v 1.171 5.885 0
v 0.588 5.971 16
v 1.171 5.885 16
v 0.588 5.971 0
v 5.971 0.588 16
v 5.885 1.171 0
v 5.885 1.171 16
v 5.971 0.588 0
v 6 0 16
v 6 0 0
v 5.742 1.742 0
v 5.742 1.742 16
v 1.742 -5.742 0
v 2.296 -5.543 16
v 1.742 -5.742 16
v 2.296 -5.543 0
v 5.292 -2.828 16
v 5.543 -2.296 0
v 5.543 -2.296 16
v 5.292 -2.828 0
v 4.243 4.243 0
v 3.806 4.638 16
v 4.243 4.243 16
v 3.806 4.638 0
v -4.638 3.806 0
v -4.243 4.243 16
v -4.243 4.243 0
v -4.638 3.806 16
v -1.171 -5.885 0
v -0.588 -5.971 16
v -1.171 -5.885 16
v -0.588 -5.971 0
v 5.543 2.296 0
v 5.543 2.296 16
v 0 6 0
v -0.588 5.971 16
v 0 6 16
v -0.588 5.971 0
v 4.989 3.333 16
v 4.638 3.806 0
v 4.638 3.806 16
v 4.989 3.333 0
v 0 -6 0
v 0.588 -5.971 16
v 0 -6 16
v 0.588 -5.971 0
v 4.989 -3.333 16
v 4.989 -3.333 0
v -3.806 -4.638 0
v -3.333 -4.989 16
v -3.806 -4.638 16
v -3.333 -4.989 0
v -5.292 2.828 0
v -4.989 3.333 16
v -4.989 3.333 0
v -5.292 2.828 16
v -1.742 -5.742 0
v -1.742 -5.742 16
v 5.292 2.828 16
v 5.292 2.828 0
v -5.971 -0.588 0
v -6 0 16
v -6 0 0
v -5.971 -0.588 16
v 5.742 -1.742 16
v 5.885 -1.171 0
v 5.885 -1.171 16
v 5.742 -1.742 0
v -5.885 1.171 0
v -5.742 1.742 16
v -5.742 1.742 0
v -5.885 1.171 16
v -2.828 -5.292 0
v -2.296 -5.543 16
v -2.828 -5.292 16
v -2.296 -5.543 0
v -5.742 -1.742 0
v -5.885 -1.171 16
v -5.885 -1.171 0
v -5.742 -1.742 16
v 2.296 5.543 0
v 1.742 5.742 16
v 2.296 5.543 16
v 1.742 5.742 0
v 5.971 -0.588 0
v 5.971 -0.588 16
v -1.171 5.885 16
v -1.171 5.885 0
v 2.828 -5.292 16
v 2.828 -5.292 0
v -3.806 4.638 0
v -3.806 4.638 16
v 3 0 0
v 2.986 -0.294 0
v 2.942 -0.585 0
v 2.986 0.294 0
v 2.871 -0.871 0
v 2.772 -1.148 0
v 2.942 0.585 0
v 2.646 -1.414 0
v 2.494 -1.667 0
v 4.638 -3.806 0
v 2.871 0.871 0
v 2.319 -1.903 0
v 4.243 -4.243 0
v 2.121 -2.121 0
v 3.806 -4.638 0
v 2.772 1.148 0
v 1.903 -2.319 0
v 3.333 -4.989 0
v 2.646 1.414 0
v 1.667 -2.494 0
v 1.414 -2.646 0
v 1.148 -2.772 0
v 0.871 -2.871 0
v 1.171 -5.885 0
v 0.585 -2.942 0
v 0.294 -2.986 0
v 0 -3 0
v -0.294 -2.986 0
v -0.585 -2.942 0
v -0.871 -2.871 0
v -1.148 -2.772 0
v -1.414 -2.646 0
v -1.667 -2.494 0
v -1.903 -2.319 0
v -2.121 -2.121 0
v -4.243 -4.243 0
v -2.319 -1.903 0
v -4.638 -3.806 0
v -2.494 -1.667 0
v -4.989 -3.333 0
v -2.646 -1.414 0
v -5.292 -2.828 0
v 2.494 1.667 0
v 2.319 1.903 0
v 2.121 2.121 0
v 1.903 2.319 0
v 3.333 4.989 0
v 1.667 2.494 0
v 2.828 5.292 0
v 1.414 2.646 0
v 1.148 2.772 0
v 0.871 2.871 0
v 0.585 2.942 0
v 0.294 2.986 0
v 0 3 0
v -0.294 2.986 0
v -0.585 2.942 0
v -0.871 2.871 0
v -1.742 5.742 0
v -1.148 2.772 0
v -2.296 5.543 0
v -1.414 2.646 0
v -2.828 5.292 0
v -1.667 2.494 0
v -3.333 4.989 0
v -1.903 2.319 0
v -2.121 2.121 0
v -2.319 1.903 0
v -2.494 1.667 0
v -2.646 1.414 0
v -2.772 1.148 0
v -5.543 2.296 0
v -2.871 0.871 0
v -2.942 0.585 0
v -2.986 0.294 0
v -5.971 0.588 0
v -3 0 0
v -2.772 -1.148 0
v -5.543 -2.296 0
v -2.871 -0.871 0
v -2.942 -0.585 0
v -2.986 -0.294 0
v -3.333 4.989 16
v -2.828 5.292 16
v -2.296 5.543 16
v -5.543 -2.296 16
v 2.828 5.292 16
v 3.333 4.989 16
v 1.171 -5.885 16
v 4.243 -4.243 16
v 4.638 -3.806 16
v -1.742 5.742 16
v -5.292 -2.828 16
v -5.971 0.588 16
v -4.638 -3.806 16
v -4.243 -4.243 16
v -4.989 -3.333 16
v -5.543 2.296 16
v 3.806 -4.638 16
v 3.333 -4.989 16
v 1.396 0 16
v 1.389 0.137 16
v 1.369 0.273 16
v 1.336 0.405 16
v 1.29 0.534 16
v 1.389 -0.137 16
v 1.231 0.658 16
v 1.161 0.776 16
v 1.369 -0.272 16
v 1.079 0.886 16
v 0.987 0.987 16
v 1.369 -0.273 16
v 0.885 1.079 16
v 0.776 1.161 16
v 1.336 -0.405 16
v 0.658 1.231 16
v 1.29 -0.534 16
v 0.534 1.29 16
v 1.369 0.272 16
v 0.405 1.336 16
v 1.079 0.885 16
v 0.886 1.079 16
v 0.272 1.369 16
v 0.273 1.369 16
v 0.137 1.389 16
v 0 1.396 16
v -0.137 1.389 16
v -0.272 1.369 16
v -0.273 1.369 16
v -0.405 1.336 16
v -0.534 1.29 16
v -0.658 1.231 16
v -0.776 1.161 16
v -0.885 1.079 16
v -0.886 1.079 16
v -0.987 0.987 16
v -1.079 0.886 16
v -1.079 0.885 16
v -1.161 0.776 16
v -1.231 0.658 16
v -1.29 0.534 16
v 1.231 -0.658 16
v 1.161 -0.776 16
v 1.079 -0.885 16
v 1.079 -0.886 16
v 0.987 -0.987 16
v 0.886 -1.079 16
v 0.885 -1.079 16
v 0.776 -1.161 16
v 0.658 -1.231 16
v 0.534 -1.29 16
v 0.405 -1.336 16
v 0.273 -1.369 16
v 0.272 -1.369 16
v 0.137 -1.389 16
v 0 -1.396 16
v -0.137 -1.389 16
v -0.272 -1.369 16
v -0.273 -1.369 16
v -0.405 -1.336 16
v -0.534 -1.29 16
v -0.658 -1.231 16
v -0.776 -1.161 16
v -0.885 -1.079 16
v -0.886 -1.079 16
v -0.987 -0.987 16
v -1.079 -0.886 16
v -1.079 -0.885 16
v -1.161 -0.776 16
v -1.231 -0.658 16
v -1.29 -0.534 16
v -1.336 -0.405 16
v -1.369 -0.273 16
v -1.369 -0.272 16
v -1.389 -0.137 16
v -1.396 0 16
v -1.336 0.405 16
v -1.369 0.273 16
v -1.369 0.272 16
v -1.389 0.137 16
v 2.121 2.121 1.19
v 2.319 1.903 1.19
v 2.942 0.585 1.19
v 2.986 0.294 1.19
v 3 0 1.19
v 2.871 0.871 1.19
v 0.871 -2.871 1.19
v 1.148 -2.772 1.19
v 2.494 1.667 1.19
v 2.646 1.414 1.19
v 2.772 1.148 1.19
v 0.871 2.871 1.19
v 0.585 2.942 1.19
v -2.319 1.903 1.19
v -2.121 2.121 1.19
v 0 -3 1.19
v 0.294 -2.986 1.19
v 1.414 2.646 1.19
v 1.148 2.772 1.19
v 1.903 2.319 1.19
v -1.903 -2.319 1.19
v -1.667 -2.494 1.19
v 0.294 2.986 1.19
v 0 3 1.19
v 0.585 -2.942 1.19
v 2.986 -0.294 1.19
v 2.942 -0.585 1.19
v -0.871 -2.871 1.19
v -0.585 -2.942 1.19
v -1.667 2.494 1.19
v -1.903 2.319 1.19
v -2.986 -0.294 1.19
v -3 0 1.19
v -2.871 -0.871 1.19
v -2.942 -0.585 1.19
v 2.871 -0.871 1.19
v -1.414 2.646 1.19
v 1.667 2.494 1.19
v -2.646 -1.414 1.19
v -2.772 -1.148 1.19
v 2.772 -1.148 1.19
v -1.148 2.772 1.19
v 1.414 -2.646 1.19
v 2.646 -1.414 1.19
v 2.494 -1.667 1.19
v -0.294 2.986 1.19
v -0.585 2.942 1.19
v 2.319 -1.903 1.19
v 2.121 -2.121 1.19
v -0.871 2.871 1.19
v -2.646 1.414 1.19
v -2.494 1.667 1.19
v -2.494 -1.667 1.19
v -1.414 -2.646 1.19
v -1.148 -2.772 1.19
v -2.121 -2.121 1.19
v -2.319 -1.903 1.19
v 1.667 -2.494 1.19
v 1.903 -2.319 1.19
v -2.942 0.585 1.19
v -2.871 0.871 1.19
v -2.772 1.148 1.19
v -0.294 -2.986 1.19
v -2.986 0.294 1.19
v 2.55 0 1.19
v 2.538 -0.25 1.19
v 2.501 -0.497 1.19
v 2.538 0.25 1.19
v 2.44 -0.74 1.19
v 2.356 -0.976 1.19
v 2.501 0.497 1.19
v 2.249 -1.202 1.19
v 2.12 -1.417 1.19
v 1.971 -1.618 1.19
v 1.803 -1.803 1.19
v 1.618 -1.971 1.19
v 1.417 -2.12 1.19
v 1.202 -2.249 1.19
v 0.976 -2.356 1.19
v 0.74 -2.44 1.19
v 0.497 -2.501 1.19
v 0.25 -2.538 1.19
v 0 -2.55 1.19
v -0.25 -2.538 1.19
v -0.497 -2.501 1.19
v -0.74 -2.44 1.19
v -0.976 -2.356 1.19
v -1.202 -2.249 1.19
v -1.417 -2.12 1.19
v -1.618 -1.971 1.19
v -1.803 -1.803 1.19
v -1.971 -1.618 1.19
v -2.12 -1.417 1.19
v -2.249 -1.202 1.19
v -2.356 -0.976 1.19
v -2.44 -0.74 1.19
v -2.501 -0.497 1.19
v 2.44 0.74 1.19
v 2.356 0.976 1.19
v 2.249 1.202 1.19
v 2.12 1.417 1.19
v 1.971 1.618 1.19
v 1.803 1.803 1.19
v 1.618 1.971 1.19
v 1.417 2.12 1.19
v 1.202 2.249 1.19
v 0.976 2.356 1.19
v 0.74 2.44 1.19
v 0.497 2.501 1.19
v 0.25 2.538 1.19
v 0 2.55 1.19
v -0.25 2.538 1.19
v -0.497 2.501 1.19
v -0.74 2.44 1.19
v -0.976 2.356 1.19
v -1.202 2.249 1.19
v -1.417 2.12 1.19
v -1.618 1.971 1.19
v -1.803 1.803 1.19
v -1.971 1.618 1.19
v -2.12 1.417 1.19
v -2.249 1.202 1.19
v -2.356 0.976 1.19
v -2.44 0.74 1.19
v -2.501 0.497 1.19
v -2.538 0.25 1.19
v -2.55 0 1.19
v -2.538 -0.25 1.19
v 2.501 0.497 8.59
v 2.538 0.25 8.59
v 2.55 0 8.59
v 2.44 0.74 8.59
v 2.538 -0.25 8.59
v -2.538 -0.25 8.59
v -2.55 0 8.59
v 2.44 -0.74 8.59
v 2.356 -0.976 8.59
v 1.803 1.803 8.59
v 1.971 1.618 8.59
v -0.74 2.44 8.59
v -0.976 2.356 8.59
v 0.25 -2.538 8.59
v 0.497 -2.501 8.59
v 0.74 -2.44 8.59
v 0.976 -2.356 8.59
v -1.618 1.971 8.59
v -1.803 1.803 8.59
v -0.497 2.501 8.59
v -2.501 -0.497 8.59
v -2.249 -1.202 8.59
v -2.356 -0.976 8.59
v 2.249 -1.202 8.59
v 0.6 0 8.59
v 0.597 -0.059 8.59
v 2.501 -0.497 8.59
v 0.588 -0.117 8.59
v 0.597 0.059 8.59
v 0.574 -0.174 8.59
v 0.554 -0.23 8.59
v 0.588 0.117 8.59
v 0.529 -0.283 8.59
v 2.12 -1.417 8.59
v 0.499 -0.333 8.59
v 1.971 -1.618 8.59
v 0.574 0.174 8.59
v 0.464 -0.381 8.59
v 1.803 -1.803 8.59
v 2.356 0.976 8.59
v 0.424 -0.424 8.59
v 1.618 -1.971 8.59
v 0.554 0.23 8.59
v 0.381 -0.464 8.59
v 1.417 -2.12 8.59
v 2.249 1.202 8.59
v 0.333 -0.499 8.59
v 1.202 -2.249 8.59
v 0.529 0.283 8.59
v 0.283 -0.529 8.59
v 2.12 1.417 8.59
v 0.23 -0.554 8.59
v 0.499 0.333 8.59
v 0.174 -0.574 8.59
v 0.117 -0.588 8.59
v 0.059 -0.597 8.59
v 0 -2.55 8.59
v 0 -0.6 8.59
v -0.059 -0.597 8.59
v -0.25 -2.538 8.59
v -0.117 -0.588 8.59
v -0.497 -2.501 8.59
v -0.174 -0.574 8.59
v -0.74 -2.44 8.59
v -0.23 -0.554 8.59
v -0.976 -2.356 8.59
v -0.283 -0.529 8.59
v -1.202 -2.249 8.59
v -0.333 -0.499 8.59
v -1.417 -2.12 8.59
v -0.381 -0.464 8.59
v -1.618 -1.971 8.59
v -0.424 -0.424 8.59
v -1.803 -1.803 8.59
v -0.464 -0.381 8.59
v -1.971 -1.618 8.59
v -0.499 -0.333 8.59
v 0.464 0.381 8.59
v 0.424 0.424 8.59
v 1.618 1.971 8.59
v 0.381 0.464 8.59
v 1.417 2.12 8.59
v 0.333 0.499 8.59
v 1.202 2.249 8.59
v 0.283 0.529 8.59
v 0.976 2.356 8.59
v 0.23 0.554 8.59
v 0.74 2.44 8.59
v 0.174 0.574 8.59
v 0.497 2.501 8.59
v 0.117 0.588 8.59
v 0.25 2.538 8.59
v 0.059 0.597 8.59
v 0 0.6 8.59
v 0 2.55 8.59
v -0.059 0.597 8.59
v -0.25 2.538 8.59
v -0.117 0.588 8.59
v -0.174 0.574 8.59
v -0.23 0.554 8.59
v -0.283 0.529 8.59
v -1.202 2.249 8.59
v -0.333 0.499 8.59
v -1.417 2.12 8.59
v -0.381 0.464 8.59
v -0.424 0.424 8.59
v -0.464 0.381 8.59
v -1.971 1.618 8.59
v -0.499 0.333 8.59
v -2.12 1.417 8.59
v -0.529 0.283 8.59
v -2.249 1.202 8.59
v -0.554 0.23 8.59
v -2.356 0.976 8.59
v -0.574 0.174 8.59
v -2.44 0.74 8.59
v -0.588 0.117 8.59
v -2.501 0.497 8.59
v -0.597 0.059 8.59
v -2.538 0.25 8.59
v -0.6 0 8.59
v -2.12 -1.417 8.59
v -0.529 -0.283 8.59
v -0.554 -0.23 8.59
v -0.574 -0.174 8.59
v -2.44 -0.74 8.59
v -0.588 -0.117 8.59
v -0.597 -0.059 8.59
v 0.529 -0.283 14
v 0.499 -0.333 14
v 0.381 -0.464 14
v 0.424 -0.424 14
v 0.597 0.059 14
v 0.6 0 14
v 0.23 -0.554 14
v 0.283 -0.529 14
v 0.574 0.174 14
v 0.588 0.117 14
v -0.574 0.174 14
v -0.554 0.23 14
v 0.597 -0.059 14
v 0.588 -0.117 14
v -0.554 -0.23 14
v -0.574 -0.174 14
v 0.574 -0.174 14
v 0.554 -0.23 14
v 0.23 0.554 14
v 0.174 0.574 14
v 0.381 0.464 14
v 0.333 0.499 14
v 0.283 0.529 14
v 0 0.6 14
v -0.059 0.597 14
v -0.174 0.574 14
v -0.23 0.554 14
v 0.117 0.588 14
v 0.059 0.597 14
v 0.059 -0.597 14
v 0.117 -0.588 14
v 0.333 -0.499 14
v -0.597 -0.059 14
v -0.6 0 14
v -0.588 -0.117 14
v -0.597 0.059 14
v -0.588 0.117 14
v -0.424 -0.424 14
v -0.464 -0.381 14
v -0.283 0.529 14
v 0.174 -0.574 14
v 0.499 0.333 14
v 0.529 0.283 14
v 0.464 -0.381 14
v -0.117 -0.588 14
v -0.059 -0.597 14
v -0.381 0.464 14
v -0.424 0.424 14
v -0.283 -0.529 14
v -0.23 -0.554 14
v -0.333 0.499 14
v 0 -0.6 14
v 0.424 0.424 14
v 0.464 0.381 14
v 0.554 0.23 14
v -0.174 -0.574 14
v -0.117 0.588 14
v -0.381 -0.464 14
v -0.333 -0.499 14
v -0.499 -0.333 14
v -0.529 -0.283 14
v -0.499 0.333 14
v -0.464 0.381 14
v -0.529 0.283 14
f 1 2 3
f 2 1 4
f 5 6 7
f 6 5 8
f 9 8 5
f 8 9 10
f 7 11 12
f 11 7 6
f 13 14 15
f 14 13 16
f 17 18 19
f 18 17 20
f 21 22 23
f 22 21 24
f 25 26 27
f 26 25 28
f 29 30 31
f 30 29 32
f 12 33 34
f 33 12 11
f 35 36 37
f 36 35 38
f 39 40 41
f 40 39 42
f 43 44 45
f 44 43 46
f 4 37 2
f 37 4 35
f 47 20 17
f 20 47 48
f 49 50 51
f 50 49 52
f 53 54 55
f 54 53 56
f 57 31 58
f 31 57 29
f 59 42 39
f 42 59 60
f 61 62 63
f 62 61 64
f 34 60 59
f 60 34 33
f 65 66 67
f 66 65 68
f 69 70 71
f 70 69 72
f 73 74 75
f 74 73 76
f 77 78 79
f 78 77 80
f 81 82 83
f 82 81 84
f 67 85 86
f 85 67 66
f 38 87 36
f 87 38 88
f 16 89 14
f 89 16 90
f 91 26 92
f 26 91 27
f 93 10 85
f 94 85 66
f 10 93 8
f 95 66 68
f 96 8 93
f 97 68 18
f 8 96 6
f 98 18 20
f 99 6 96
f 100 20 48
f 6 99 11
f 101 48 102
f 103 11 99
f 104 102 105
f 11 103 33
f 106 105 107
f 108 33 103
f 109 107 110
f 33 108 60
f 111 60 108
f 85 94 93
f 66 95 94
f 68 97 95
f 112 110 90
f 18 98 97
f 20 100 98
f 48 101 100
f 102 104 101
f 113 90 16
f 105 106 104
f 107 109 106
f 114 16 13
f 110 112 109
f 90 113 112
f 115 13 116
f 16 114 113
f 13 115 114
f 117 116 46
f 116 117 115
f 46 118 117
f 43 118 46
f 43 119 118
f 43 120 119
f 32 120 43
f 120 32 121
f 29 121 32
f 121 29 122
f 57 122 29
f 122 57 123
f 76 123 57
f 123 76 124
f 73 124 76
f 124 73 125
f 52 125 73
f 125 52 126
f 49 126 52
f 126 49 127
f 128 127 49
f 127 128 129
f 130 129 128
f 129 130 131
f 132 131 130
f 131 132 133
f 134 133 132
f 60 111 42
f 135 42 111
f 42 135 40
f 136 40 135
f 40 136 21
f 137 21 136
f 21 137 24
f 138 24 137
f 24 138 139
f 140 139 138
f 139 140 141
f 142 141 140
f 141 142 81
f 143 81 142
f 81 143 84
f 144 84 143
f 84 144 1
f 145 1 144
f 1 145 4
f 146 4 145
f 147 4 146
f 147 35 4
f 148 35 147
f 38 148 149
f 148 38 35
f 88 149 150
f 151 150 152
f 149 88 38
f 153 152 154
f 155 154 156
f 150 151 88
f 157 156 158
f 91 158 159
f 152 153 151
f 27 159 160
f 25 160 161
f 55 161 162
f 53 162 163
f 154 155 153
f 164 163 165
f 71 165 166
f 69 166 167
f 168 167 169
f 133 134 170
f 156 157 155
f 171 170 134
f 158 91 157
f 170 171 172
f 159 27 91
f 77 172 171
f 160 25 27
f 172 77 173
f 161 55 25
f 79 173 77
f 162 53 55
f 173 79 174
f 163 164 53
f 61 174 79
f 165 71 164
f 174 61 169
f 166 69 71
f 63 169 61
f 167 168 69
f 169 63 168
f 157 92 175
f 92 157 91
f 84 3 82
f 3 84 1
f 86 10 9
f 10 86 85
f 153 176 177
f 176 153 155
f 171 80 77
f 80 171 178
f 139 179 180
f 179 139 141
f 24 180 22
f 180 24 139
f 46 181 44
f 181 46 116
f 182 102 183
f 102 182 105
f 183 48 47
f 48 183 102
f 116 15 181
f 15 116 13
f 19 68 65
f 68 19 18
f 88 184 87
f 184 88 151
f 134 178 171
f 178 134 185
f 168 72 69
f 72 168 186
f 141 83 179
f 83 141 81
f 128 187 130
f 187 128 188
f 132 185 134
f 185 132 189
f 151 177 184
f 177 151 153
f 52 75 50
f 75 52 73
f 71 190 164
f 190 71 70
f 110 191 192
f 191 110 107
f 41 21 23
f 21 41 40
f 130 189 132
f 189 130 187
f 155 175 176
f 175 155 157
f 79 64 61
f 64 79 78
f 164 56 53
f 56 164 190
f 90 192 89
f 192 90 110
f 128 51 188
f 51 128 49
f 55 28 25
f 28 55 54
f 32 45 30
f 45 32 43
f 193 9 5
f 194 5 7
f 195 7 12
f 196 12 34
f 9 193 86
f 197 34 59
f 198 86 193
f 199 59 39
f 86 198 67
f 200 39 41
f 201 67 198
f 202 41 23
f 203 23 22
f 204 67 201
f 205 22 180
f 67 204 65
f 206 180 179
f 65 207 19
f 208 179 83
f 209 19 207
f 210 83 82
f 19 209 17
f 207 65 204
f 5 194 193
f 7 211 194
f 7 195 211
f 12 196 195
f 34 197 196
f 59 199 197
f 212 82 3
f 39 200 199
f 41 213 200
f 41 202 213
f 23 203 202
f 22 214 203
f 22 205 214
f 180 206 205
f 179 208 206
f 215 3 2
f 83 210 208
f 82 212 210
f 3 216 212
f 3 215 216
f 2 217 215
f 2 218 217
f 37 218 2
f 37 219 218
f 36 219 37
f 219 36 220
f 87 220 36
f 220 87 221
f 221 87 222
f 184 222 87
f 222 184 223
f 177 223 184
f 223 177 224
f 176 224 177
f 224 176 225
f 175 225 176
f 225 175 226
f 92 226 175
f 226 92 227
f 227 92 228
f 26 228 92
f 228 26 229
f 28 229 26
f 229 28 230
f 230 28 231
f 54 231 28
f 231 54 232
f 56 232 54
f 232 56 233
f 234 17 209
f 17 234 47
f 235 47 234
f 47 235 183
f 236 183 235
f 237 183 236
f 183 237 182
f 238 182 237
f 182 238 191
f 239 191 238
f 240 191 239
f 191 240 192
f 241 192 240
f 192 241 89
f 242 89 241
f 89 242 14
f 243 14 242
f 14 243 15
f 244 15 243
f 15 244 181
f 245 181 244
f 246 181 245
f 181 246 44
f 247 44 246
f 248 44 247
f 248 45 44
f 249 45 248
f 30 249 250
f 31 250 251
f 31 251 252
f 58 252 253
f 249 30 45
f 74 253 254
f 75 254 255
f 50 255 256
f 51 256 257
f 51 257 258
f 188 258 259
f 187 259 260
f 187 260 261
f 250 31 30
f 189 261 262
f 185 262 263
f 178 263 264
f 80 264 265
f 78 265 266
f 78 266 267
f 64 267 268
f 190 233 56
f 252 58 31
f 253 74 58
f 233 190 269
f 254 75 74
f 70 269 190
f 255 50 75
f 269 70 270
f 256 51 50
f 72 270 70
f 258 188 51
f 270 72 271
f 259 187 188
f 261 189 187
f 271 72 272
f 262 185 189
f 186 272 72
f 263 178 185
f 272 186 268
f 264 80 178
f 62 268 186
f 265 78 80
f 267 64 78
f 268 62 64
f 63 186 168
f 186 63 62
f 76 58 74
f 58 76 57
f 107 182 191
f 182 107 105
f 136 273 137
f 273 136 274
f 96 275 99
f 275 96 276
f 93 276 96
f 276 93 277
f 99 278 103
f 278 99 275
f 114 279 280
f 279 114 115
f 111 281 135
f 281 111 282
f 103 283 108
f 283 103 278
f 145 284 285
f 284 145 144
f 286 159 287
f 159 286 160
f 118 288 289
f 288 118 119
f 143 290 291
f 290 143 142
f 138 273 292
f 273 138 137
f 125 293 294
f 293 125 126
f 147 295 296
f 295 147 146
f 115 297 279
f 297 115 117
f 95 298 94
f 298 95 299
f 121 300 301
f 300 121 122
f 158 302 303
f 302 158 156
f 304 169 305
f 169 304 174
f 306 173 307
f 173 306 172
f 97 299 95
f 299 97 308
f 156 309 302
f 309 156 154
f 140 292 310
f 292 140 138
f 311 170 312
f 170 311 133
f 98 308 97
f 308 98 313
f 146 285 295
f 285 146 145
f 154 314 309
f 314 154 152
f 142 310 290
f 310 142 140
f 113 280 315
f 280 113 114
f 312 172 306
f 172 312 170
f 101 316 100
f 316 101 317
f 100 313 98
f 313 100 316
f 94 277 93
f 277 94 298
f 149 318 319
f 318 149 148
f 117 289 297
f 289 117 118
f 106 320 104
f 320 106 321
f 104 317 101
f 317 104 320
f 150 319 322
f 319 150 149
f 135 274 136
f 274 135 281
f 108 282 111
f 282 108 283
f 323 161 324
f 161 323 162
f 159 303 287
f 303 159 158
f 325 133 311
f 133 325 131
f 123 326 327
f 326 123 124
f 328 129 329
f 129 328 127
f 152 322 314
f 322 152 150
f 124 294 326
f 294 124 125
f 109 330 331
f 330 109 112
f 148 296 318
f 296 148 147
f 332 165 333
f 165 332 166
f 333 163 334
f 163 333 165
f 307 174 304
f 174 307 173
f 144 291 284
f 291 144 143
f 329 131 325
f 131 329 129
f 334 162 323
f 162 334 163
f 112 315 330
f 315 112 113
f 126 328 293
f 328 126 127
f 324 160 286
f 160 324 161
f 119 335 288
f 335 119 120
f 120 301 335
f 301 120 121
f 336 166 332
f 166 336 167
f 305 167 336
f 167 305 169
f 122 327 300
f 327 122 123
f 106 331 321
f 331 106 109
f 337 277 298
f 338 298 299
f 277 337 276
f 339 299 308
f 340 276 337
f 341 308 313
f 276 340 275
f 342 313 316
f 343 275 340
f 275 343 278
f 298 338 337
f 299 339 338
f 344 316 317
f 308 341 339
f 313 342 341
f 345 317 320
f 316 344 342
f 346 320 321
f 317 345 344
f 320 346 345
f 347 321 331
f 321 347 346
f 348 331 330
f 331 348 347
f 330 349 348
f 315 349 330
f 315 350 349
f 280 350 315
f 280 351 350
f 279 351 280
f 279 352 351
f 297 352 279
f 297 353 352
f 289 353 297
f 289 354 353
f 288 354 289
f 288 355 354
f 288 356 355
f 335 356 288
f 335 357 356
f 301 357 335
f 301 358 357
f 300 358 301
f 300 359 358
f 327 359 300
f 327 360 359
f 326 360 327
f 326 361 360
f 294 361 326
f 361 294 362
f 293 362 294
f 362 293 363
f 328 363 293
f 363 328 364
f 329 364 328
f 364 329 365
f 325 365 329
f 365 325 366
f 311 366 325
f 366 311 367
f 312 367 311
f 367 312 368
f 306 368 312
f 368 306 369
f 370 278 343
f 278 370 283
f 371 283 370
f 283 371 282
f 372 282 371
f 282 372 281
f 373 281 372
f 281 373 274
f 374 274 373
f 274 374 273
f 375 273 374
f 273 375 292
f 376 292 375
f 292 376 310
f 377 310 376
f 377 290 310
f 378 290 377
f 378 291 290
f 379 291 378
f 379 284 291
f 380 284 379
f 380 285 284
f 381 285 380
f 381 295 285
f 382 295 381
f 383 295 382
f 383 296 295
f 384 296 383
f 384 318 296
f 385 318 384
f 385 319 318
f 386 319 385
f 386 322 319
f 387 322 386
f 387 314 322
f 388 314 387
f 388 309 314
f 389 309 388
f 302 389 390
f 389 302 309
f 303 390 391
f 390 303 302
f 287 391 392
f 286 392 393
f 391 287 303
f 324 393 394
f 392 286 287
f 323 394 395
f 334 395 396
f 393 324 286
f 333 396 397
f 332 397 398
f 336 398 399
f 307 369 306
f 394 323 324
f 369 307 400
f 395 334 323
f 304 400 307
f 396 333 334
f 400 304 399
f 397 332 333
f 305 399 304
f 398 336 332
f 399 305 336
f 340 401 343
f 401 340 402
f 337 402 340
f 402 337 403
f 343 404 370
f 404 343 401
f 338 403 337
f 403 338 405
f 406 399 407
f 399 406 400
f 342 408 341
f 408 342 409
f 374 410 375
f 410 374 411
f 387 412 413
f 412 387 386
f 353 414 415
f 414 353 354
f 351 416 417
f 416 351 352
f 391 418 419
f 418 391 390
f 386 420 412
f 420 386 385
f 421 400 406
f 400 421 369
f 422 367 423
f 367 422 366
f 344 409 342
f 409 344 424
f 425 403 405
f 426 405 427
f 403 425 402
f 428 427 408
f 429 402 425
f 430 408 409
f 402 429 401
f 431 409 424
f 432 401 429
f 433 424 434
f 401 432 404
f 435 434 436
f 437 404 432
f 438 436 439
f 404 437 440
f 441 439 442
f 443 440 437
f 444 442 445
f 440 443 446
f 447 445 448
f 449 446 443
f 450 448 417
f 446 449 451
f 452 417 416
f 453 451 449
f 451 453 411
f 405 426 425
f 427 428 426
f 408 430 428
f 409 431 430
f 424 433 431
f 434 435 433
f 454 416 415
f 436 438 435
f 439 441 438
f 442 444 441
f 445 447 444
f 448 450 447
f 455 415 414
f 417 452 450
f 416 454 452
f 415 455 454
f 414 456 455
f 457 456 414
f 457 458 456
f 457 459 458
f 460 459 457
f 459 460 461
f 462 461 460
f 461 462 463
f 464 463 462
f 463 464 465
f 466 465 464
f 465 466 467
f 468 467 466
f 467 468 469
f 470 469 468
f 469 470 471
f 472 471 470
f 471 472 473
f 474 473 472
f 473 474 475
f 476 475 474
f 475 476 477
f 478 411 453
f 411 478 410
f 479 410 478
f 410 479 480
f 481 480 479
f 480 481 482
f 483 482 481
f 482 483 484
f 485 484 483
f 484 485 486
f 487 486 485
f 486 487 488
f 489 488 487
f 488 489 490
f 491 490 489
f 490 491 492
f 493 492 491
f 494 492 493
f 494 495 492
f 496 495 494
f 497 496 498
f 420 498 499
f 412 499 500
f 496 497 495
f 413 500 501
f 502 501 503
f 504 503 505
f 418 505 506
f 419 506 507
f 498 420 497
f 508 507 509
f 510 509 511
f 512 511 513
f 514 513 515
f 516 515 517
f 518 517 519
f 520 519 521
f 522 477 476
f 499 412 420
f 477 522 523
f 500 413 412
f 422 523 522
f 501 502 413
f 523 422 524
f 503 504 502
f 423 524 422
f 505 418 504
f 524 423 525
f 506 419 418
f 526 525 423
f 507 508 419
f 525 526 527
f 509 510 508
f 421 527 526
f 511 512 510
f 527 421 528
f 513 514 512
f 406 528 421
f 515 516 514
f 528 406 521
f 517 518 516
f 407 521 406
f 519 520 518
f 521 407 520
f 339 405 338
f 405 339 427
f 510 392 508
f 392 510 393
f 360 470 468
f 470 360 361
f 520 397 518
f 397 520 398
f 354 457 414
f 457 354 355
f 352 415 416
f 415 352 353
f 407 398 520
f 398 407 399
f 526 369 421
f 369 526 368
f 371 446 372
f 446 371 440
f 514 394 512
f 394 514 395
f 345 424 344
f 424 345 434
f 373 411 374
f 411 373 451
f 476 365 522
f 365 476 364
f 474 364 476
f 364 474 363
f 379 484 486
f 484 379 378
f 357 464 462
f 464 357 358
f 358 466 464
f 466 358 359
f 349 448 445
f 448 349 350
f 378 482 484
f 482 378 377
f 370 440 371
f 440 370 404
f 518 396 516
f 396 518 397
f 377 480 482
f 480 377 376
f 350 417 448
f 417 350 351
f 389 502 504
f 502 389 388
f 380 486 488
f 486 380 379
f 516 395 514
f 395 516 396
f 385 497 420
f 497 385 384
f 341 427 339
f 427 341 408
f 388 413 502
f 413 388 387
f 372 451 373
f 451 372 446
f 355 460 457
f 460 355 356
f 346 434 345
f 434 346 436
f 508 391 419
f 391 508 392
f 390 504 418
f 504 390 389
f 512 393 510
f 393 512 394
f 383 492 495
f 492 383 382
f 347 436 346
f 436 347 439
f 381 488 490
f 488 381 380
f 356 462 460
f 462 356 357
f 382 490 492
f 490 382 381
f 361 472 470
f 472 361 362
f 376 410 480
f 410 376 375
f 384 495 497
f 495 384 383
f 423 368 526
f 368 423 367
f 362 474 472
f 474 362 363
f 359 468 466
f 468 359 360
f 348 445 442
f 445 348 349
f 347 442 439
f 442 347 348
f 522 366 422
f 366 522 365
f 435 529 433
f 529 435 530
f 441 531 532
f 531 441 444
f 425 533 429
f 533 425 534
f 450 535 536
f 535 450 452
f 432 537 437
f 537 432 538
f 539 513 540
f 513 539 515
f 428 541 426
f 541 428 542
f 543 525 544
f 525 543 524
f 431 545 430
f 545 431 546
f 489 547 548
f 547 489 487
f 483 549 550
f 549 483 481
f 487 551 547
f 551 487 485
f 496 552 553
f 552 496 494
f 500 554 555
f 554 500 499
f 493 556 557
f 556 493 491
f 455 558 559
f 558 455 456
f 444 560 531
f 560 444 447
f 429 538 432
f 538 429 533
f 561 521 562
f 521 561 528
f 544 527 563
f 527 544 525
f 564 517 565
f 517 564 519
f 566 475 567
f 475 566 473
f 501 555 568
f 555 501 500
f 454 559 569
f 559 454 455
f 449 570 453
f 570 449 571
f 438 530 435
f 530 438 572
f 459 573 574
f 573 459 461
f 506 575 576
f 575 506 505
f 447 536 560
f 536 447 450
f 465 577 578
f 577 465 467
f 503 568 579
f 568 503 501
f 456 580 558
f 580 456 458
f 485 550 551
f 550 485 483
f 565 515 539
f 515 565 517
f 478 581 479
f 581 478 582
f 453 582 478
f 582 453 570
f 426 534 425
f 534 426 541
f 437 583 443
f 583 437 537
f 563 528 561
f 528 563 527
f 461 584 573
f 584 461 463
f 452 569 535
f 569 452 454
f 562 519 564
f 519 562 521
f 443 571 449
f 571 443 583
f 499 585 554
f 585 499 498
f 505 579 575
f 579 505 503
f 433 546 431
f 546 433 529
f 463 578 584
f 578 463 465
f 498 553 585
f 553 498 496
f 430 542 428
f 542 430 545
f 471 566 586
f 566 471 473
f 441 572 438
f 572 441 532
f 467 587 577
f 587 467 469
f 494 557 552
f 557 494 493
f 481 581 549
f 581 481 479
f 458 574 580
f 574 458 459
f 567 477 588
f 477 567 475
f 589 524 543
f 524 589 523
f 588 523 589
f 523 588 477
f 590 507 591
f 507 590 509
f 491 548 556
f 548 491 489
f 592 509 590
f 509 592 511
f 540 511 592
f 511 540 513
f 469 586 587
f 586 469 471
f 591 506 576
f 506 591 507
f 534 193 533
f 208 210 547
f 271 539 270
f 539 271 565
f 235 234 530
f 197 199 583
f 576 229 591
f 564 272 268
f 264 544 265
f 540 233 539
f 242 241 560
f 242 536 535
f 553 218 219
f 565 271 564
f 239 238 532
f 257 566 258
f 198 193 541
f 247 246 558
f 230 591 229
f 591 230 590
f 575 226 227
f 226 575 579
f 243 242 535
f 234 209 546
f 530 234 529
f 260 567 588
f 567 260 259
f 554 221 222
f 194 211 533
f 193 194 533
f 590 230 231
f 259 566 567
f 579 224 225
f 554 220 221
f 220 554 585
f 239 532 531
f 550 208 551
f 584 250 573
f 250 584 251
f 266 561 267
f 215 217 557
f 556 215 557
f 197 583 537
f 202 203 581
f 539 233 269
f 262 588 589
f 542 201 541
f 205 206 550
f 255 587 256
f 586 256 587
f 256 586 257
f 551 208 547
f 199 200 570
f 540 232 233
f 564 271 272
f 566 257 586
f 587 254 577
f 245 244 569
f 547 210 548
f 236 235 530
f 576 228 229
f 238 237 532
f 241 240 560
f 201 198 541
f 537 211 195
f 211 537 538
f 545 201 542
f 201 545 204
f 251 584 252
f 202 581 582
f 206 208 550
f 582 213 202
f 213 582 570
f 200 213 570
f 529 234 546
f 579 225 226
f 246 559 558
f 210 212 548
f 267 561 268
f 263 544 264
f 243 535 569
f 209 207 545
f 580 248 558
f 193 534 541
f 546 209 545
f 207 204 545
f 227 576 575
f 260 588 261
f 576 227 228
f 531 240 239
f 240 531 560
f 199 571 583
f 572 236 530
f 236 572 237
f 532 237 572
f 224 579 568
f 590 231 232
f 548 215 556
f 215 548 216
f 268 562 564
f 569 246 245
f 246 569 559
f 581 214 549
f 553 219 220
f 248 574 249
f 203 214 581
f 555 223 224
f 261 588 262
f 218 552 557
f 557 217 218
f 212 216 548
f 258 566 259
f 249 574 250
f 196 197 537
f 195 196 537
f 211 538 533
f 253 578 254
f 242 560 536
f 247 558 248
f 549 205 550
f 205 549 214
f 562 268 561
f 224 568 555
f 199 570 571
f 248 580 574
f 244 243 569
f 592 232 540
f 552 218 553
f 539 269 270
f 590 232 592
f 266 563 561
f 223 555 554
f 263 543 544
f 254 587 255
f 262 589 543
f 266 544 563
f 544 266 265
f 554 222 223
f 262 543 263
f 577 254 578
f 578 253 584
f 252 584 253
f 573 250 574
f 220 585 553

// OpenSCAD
// WetStack-0 fiber parts (Phase 7). part = "led" prints the LED-to-fiber coupler,
// part = "cap" prints the light-tight cap that holds a fiber over the AS7341 sensor.
// Clone AS7341 boards vary: measure yours and edit the board block.

part = "led";            // "led" or "cap"
fiber_d = 1.2;           // bore for 1.0 mm PMMA fiber
$fn = 64;

// LED coupler: 5 mm LED pushed in from one end, fiber from the other, tip to tip
led_d = 5.1;  led_len = 8.6;  flange_d = 6.0;  flange_h = 1.2;  body_d = 12;  body_h = 16;

// AS7341 board (Adafruit defaults)
board_x = 25.4;  board_y = 17.8;  board_t = 1.6;
sensor_x = 12.7; sensor_y = 8.9;          // sensor centre from the board's lower-left corner
hole_inset = 2.54;  hole_d = 2.7;
cap_h = 12;  skirt_h = 4;  wall = 2;

module led_coupler() {
  difference() {
    cylinder(d = body_d, h = body_h);
    translate([0, 0, -0.01]) cylinder(d = flange_d, h = flange_h);
    translate([0, 0, -0.01]) cylinder(d = led_d, h = led_len);
    translate([0, 0, led_len - 0.5]) cylinder(d = fiber_d, h = body_h);
    translate([0, 0, body_h - 2]) cylinder(d1 = fiber_d, d2 = fiber_d + 1.6, h = 2.01); // lead-in
  }
}

module sensor_cap() {
  difference() {
    translate([-wall, -wall, 0]) cube([board_x + 2*wall, board_y + 2*wall, cap_h]);
    translate([0, 0, -0.01]) cube([board_x, board_y, skirt_h]);                       // board pocket
    translate([sensor_x, sensor_y, -1]) cylinder(d = fiber_d, h = cap_h + 2);          // fiber bore
    translate([sensor_x, sensor_y, cap_h - 3]) cylinder(d1 = fiber_d, d2 = fiber_d + 2, h = 3.01);
    translate([sensor_x, sensor_y, skirt_h - 0.01]) cylinder(d = 3.0, h = 1.5);        // clear the sensor package
    for (x = [hole_inset, board_x - hole_inset], y = [hole_inset, board_y - hole_inset])
      translate([x, y, -1]) cylinder(d = hole_d, h = cap_h + 2);
  }
}

if (part == "led") led_coupler(); else sensor_cap();
